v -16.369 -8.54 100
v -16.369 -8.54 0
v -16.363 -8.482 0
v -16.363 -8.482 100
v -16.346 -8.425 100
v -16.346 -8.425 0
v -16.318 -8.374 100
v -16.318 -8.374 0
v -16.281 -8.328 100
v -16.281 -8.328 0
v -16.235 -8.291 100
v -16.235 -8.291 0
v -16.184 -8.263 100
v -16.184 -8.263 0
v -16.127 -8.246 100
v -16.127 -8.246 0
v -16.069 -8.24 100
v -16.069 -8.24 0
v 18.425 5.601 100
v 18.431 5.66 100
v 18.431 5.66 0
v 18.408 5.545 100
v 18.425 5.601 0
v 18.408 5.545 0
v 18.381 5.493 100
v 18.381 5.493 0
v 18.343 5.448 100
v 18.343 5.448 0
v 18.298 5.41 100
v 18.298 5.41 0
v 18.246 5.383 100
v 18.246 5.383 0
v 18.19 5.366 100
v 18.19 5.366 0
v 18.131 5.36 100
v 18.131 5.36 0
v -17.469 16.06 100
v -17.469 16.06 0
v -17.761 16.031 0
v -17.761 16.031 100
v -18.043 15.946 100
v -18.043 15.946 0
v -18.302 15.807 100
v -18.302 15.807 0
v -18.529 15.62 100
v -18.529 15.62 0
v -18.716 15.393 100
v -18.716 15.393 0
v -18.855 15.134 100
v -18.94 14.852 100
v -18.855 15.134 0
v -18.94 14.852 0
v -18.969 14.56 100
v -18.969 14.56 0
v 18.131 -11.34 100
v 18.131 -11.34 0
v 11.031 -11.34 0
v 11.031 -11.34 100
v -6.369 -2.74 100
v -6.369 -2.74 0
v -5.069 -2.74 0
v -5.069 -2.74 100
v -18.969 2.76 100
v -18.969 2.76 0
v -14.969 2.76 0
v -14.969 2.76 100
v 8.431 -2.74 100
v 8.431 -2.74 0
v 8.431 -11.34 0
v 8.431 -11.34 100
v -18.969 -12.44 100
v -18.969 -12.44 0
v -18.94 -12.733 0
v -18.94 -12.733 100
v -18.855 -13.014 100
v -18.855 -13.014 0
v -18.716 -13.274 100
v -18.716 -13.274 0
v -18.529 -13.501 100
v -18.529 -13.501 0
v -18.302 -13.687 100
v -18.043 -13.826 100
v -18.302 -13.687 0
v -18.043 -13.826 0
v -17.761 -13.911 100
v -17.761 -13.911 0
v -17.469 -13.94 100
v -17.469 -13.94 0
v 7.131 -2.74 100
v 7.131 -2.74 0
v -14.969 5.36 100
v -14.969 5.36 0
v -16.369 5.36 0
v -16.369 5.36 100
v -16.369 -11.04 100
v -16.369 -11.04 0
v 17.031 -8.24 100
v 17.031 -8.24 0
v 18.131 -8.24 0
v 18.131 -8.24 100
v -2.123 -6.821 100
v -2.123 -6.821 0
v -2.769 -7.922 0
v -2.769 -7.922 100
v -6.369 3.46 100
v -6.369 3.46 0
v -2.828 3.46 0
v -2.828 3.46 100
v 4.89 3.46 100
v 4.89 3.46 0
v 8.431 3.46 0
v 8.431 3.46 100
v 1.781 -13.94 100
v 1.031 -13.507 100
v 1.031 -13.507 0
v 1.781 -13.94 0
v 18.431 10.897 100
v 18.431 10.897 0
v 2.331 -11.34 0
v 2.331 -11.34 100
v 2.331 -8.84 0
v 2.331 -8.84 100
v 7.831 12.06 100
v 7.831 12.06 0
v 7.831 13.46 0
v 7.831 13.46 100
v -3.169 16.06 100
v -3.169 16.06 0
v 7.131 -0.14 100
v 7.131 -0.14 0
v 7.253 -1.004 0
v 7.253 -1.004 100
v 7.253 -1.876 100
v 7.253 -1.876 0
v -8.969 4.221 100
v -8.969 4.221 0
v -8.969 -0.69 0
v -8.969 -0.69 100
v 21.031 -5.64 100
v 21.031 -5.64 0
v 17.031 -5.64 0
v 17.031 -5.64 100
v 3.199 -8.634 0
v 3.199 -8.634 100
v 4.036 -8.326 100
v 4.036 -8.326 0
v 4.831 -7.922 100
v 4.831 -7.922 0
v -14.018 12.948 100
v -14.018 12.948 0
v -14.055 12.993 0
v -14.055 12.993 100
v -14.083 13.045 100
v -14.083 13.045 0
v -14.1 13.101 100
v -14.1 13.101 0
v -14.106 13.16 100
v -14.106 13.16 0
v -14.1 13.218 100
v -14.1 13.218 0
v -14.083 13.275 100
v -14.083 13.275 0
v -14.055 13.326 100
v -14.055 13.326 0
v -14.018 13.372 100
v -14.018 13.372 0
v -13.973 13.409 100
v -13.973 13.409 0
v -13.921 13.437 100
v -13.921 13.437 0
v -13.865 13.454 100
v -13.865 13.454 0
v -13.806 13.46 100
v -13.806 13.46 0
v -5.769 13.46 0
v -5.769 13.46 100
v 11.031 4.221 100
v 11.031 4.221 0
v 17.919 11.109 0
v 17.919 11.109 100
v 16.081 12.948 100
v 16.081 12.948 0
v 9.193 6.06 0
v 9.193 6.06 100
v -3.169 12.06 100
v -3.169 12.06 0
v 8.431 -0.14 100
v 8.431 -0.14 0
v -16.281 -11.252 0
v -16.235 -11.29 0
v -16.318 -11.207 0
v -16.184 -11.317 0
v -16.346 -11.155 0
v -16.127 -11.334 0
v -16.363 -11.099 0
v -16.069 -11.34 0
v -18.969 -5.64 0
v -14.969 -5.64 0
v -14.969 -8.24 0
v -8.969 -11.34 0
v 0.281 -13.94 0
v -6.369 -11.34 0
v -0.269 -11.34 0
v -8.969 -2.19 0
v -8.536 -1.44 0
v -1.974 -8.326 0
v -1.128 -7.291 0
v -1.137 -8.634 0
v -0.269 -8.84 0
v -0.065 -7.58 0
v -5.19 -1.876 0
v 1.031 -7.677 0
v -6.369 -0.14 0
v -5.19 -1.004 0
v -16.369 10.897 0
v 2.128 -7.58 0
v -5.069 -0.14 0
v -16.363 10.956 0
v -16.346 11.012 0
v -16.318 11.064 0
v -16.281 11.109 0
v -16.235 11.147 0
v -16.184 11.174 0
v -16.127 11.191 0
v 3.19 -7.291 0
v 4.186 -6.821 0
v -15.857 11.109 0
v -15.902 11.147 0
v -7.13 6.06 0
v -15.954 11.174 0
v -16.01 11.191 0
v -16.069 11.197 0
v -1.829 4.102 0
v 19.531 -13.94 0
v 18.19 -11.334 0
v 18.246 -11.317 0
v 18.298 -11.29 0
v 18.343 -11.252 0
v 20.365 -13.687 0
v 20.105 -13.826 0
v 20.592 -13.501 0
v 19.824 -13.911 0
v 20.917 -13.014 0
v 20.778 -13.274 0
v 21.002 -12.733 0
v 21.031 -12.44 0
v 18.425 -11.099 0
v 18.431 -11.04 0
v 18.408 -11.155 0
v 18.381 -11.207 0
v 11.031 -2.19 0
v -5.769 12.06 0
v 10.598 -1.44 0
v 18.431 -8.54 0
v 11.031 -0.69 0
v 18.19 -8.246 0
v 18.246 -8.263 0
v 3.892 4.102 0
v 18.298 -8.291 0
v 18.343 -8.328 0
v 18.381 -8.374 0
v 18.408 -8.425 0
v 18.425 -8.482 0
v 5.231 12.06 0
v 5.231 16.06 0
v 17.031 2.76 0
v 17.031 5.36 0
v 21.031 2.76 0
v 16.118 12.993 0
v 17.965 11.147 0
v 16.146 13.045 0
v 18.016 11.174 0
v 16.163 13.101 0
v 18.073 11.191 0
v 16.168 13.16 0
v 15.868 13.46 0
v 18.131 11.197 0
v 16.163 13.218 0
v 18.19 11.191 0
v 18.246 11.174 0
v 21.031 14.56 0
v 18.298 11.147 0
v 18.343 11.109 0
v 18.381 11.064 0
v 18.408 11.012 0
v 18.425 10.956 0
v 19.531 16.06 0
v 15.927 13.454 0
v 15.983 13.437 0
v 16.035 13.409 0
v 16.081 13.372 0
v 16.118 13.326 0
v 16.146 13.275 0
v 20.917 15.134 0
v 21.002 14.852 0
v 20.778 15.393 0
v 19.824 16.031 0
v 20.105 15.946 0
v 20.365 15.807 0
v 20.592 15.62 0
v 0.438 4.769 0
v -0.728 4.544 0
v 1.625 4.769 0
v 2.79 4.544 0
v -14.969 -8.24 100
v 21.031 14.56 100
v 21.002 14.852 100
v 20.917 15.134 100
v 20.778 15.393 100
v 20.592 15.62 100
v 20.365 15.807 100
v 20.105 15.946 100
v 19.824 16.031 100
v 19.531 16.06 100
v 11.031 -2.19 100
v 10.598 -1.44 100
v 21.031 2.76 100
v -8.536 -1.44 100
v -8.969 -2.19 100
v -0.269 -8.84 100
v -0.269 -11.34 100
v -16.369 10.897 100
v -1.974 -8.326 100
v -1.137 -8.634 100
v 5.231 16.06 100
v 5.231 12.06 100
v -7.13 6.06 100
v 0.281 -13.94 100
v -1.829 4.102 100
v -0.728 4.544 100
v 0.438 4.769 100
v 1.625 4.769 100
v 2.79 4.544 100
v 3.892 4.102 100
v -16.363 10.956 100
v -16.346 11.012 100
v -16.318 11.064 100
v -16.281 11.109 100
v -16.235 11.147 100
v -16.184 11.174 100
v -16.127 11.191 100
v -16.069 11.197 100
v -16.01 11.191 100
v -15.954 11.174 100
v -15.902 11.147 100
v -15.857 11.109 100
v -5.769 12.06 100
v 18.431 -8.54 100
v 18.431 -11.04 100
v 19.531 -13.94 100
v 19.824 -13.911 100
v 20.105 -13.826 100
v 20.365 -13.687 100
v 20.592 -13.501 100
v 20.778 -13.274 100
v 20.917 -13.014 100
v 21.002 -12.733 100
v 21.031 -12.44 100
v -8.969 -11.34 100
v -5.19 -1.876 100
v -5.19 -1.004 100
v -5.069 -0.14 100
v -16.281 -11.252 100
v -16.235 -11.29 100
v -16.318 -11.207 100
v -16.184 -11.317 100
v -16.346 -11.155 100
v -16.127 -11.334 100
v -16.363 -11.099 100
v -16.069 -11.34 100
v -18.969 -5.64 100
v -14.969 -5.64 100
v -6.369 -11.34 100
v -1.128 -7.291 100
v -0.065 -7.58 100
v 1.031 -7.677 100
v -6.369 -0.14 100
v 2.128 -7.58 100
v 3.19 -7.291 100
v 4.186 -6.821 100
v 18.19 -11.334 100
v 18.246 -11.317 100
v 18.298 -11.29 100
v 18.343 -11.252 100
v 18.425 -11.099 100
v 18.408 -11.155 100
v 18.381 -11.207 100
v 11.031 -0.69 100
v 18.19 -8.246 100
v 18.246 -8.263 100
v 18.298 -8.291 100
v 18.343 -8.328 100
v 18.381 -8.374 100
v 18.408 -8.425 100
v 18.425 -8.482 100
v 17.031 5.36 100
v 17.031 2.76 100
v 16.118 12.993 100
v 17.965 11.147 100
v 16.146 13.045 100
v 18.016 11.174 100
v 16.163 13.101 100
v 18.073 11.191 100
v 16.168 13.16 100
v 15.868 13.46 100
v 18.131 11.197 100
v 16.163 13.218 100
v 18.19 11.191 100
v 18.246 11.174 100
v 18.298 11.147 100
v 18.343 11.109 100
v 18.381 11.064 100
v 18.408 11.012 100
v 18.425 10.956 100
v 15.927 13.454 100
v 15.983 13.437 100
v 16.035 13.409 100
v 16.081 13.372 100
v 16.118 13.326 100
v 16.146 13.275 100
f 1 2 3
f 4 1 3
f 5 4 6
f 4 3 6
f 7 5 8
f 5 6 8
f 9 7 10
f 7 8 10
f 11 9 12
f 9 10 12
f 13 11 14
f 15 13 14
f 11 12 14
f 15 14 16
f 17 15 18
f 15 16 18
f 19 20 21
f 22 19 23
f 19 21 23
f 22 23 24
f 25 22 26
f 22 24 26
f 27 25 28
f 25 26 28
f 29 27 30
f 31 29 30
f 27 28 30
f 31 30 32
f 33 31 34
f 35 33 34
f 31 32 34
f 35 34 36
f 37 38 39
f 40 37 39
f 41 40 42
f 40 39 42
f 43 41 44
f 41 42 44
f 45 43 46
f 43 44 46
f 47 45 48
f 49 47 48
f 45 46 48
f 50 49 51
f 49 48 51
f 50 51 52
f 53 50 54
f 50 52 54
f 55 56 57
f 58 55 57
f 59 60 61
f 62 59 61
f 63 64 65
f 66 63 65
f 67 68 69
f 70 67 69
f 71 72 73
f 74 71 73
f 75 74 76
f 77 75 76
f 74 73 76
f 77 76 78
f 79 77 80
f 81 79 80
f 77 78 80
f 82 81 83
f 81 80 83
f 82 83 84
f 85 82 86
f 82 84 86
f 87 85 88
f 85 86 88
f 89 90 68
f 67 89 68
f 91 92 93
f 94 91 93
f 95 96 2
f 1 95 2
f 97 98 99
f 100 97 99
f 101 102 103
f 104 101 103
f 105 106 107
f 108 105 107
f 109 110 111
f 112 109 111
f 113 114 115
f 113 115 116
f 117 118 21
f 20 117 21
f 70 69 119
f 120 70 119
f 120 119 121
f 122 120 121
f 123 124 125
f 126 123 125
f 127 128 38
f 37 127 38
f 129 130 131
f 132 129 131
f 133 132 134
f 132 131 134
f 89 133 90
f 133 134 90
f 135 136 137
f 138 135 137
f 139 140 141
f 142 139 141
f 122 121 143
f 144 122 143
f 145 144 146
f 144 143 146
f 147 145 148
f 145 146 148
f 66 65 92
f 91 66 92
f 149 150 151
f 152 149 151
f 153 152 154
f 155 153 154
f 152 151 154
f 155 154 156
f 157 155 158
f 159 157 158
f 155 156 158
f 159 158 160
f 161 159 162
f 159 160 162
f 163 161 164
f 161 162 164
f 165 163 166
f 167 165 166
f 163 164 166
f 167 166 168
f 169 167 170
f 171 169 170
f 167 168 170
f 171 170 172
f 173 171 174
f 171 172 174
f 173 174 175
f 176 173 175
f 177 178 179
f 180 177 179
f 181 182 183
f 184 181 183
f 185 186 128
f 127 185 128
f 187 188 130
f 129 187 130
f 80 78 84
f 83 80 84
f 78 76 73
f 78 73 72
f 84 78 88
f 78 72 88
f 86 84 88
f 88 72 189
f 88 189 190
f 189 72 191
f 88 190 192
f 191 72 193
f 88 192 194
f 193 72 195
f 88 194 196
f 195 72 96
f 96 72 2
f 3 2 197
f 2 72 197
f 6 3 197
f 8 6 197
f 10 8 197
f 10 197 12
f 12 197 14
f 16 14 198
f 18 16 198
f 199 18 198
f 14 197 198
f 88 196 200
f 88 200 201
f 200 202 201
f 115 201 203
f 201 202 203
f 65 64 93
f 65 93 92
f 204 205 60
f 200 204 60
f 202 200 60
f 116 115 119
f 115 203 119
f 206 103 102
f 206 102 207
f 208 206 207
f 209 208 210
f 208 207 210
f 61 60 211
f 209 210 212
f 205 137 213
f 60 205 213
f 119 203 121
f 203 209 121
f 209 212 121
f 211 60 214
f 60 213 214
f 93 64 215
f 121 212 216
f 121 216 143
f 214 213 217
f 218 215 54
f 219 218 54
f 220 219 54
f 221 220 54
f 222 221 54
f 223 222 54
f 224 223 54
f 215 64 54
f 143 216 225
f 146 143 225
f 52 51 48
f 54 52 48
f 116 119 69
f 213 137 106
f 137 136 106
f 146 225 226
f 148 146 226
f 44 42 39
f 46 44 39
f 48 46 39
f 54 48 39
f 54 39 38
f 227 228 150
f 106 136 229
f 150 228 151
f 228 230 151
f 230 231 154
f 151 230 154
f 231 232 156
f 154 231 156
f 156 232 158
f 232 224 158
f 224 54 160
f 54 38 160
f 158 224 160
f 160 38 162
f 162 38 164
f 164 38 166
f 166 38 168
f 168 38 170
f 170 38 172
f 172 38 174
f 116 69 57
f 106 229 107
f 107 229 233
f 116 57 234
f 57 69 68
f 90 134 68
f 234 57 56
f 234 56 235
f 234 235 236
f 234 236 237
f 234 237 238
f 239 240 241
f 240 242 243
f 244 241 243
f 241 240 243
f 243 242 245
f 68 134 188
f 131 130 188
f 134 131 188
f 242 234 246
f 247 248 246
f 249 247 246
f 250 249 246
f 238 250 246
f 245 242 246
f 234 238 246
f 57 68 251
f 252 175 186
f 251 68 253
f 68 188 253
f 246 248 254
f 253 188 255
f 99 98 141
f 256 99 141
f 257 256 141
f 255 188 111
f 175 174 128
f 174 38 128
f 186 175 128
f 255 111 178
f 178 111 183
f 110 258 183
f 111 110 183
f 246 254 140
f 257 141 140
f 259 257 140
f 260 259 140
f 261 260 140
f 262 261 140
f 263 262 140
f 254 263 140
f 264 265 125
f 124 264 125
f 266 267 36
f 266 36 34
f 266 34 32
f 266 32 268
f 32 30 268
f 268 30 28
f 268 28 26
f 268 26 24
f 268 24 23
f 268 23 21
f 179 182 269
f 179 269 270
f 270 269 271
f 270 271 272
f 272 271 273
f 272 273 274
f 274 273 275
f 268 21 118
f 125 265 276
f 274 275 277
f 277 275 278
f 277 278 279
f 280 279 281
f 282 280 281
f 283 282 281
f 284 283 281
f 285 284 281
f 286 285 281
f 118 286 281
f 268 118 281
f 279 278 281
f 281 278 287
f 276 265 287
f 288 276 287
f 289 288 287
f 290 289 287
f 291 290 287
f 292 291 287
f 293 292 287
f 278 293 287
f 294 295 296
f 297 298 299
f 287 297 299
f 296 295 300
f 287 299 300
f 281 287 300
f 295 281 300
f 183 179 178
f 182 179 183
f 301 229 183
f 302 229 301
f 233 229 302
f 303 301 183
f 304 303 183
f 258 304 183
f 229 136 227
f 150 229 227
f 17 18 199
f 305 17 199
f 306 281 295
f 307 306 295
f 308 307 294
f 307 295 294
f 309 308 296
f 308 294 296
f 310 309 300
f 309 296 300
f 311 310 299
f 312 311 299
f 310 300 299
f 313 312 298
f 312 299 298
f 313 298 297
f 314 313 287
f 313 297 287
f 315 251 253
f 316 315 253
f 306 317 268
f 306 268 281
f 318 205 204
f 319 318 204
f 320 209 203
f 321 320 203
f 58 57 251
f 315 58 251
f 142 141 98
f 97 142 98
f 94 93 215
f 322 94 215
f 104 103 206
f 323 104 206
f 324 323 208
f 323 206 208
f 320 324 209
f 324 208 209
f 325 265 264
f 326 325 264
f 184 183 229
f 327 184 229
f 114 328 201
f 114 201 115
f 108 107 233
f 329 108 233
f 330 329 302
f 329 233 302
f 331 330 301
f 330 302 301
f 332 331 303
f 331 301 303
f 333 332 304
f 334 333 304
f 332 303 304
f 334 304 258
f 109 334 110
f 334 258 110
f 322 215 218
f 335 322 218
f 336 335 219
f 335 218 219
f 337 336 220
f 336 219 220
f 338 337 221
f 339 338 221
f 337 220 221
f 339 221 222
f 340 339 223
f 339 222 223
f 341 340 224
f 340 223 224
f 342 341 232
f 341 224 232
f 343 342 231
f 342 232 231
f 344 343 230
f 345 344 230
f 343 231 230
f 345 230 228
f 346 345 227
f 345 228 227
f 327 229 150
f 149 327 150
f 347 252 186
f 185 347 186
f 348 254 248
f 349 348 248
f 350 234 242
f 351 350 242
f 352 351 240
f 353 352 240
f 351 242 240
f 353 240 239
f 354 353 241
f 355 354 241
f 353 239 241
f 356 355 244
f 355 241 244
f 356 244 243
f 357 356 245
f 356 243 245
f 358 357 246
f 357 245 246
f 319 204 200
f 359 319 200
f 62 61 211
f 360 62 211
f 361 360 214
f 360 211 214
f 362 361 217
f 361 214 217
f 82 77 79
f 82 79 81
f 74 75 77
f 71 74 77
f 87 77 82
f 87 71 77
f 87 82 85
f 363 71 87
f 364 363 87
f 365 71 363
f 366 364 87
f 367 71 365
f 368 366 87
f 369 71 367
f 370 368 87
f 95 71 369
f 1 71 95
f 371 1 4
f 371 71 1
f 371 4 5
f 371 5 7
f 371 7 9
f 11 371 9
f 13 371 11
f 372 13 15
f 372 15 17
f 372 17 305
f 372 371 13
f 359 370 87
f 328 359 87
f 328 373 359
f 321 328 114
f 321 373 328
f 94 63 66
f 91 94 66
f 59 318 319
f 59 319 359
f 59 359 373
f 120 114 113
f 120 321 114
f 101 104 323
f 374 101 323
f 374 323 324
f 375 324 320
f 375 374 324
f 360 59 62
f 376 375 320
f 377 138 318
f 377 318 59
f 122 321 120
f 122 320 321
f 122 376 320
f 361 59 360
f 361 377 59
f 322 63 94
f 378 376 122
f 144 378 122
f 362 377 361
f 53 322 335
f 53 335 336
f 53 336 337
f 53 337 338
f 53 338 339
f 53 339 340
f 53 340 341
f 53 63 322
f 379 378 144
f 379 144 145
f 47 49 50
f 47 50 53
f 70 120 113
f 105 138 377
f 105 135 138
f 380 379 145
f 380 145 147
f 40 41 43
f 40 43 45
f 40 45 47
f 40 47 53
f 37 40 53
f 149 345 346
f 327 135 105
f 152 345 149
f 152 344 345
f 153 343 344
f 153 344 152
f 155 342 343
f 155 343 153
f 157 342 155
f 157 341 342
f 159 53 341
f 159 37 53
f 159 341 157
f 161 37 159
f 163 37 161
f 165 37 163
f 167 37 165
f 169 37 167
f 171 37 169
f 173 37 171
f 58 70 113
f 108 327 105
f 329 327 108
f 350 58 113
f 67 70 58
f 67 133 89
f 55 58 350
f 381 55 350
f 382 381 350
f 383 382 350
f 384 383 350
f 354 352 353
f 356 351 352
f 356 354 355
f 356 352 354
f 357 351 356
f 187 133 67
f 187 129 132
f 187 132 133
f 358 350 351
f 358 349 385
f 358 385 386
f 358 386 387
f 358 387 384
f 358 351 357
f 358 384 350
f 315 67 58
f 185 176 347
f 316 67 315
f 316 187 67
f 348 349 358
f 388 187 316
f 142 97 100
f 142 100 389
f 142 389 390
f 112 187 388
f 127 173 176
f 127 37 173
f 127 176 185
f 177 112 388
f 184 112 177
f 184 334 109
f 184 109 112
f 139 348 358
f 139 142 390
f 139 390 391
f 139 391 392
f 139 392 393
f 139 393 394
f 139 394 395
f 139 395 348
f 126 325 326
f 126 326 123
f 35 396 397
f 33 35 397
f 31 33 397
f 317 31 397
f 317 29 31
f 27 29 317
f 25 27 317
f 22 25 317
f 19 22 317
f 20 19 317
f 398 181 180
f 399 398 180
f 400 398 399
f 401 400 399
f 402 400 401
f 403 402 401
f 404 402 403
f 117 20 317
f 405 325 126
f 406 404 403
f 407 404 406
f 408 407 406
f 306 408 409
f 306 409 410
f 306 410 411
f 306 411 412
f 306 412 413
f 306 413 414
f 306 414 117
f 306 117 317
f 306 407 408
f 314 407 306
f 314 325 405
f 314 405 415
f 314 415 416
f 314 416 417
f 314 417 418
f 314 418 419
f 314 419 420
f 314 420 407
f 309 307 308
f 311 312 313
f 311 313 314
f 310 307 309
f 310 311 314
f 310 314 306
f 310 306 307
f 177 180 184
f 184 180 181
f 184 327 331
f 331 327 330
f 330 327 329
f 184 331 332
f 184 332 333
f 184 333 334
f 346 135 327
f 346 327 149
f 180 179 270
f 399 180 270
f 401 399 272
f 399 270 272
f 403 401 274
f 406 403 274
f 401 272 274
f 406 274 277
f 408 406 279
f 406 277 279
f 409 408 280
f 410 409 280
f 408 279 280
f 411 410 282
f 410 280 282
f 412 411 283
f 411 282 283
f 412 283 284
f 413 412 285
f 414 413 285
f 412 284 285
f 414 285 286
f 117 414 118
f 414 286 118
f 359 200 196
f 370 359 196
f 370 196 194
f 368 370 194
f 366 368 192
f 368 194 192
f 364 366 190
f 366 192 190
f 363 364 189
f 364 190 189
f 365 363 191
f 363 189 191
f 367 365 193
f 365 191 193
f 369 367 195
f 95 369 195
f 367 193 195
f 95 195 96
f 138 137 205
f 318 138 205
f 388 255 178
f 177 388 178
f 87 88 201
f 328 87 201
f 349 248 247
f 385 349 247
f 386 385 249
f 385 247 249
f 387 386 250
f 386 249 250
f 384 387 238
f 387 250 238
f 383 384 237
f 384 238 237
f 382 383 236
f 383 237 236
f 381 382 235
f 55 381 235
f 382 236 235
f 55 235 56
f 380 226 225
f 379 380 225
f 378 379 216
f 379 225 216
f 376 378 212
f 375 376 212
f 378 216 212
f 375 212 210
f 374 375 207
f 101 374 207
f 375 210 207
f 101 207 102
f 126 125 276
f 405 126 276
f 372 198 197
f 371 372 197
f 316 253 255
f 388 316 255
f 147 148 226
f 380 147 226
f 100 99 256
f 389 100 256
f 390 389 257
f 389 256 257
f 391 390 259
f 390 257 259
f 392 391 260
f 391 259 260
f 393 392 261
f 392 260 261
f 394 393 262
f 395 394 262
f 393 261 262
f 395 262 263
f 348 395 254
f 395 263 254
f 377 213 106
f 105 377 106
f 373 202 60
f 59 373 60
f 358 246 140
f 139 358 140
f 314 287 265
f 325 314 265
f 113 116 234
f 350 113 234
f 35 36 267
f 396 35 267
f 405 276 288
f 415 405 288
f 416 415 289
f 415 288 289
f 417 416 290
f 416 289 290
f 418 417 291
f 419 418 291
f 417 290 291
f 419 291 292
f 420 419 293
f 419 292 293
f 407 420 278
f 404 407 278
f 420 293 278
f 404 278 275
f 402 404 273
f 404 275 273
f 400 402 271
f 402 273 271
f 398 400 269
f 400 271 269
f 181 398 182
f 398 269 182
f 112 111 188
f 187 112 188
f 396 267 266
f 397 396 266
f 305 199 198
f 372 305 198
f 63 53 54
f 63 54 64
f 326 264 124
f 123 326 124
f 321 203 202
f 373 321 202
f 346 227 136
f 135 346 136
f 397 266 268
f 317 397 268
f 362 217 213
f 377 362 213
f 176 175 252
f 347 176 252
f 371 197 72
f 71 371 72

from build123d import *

# Parameters (mm, degrees)
EXTRUDE_1_DEPTH = 100


with BuildPart() as part:
    # 草图1 → 凸台-拉伸1 (new body)
    with BuildSketch(Plane.XY):
        with BuildLine():
            Line((-17.468782805, -13.940182328), (0.281217195, -13.940182328))
            Line((0.281217195, -13.940182328), (1.031217195, -13.507169626))
            Line((1.031217195, -13.507169626), (1.781217195, -13.940182328))
            Line((1.781217195, -13.940182328), (19.531217195, -13.940182328))
            ThreePointArc((19.531217195, -13.940182328), (20.591877367, -13.5008425), (21.031217195, -12.440182328))
            Line((21.031217195, -12.440182328), (21.031217195, -5.640182328))
            Line((21.031217195, -5.640182328), (17.031217195, -5.640182328))
            Line((17.031217195, -5.640182328), (17.031217195, -8.240182328))
            Line((17.031217195, -8.240182328), (18.131217195, -8.240182328))
            ThreePointArc((18.131217195, -8.240182328), (18.343349229, -8.328050294), (18.431217195, -8.540182328))
            Line((18.431217195, -8.540182328), (18.431217195, -11.040182328))
            ThreePointArc((18.431217195, -11.040182328), (18.343349229, -11.252314363), (18.131217195, -11.340182328))
            Line((18.131217195, -11.340182328), (11.031217195, -11.340182328))
            Line((11.031217195, -11.340182328), (11.031217195, -2.190182328))
            Line((11.031217195, -2.190182328), (10.598204493, -1.440182328))
            Line((10.598204493, -1.440182328), (11.031217195, -0.690182328))
            Line((11.031217195, -0.690182328), (11.031217195, 4.221340041))
            Line((11.031217195, 4.221340041), (17.919085161, 11.109208006))
            ThreePointArc((17.919085161, 11.109208006), (18.246022225, 11.174239832), (18.431217195, 10.897075972))
            Line((18.431217195, 10.897075972), (18.431217195, 5.659817672))
            ThreePointArc((18.431217195, 5.659817672), (18.343349229, 5.447685637), (18.131217195, 5.359817672))
            Line((18.131217195, 5.359817672), (17.031217195, 5.359817672))
            Line((17.031217195, 5.359817672), (17.031217195, 2.759817672))
            Line((17.031217195, 2.759817672), (21.031217195, 2.759817672))
            Line((21.031217195, 2.759817672), (21.031217195, 14.559817672))
            ThreePointArc((21.031217195, 14.559817672), (20.591877367, 15.620477844), (19.531217195, 16.059817672))
            Line((19.531217195, 16.059817672), (5.231217195, 16.059817672))
            Line((5.231217195, 16.059817672), (5.231217195, 12.059817672))
            Line((5.231217195, 12.059817672), (7.831217195, 12.059817672))
            Line((7.831217195, 12.059817672), (7.831217195, 13.459817672))
            Line((7.831217195, 13.459817672), (15.868475495, 13.459817672))
            ThreePointArc((15.868475495, 13.459817672), (16.145639355, 13.274622702), (16.080607529, 12.947685637))
            Line((16.080607529, 12.947685637), (9.192739564, 6.059817672))
            Line((9.192739564, 6.059817672), (-7.130305174, 6.059817672))
            Line((-7.130305174, 6.059817672), (-14.01817314, 12.947685637))
            ThreePointArc((-14.01817314, 12.947685637), (-14.083204965, 13.274622702), (-13.806041105, 13.459817672))
            Line((-13.806041105, 13.459817672), (-5.768782805, 13.459817672))
            Line((-5.768782805, 13.459817672), (-5.768782805, 12.059817672))
            Line((-5.768782805, 12.059817672), (-3.168782805, 12.059817672))
            Line((-3.168782805, 12.059817672), (-3.168782805, 16.059817672))
            Line((-3.168782805, 16.059817672), (-17.468782805, 16.059817672))
            ThreePointArc((-17.468782805, 16.059817672), (-18.529442977, 15.620477844), (-18.968782805, 14.559817672))
            Line((-18.968782805, 14.559817672), (-18.968782805, 2.759817672))
            Line((-18.968782805, 2.759817672), (-14.968782805, 2.759817672))
            Line((-14.968782805, 2.759817672), (-14.968782805, 5.359817672))
            Line((-14.968782805, 5.359817672), (-16.368782805, 5.359817672))
            Line((-16.368782805, 5.359817672), (-16.368782805, 10.897075972))
            ThreePointArc((-16.368782805, 10.897075972), (-16.183587835, 11.174239832), (-15.856650771, 11.109208006))
            Line((-15.856650771, 11.109208006), (-8.968782805, 4.221340041))
            Line((-8.968782805, 4.221340041), (-8.968782805, -0.690182328))
            Line((-8.968782805, -0.690182328), (-8.535770103, -1.440182328))
            Line((-8.535770103, -1.440182328), (-8.968782805, -2.190182328))
            Line((-8.968782805, -2.190182328), (-8.968782805, -11.340182328))
            Line((-8.968782805, -11.340182328), (-16.068782805, -11.340182328))
            ThreePointArc((-16.068782805, -11.340182328), (-16.280914839, -11.252314363), (-16.368782805, -11.040182328))
            Line((-16.368782805, -11.040182328), (-16.368782805, -8.540182328))
            ThreePointArc((-16.368782805, -8.540182328), (-16.280914839, -8.328050294), (-16.068782805, -8.240182328))
            Line((-16.068782805, -8.240182328), (-14.968782805, -8.240182328))
            Line((-14.968782805, -8.240182328), (-14.968782805, -5.640182328))
            Line((-14.968782805, -5.640182328), (-18.968782805, -5.640182328))
            Line((-18.968782805, -5.640182328), (-18.968782805, -12.440182328))
            ThreePointArc((-18.968782805, -12.440182328), (-18.529442977, -13.5008425), (-17.468782805, -13.940182328))
        make_face()
        with BuildLine():
            Line((-6.368782805, 3.459817672), (-2.827539081, 3.459817672))
            ThreePointArc((-2.827539081, 3.459817672), (1.031217195, 4.796804124), (4.889973471, 3.459817672))
            Line((4.889973471, 3.459817672), (8.431217195, 3.459817672))
            Line((8.431217195, 3.459817672), (8.431217195, -0.140182328))
            Line((8.431217195, -0.140182328), (7.131217195, -0.140182328))
            ThreePointArc((7.131217195, -0.140182328), (7.268203647, -1.440182328), (7.131217195, -2.740182328))
            Line((7.131217195, -2.740182328), (8.431217195, -2.740182328))
            Line((8.431217195, -2.740182328), (8.431217195, -11.340182328))
            Line((8.431217195, -11.340182328), (2.331217195, -11.340182328))
            Line((2.331217195, -11.340182328), (2.331217195, -8.840182328))
            ThreePointArc((2.331217195, -8.840182328), (3.622241119, -8.492600001), (4.831217195, -7.921694497))
            Line((4.831217195, -7.921694497), (4.18568736, -6.82063937))
            ThreePointArc((4.18568736, -6.82063937), (1.031217195, -7.67716878), (-2.12325297, -6.82063937))
            Line((-2.12325297, -6.82063937), (-2.768782805, -7.921694497))
            ThreePointArc((-2.768782805, -7.921694497), (-1.559806729, -8.492600001), (-0.268782805, -8.840182328))
            Line((-0.268782805, -8.840182328), (-0.268782805, -11.340182328))
            Line((-0.268782805, -11.340182328), (-6.368782805, -11.340182328))
            Line((-6.368782805, -11.340182328), (-6.368782805, -2.740182328))
            Line((-6.368782805, -2.740182328), (-5.068782805, -2.740182328))
            ThreePointArc((-5.068782805, -2.740182328), (-5.205769257, -1.440182328), (-5.068782805, -0.140182328))
            Line((-5.068782805, -0.140182328), (-6.368782805, -0.140182328))
            Line((-6.368782805, -0.140182328), (-6.368782805, 3.459817672))
        make_face(mode=Mode.SUBTRACT)
    extrude(amount=EXTRUDE_1_DEPTH)


solid = part.part
